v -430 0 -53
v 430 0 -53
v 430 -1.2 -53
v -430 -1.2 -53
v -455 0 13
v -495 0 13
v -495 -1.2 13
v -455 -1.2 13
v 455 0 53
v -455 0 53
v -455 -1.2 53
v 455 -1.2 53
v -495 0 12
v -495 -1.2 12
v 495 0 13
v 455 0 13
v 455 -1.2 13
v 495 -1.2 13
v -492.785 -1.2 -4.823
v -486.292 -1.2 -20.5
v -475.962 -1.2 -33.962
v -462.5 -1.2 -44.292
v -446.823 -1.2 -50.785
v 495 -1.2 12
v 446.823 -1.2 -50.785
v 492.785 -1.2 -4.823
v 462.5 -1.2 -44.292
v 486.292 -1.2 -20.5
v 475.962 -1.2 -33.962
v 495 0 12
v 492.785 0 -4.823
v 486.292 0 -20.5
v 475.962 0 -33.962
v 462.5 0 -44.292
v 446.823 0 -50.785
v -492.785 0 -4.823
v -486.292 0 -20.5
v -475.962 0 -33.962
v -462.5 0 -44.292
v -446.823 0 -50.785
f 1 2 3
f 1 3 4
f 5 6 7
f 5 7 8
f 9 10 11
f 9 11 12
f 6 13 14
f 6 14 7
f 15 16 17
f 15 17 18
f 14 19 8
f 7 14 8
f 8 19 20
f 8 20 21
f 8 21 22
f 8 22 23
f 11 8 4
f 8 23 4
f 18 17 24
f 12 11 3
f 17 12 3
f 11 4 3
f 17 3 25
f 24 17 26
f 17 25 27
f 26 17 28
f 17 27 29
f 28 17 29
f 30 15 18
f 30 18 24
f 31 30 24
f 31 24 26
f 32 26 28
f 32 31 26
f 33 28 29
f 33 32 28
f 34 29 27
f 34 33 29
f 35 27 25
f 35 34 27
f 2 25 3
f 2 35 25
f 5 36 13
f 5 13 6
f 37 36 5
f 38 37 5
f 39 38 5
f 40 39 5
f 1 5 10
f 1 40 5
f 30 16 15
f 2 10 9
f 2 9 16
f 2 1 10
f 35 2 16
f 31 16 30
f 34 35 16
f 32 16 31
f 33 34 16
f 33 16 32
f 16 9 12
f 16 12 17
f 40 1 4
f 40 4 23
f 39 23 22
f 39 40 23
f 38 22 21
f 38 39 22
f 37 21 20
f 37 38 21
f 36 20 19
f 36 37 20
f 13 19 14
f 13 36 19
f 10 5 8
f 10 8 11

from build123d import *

# Parameters (mm, degrees)
BASE_FLANGE1_DEPTH = 1.2


# Sheet-metal steps are written as plain solids
with BuildPart() as part:
    # Sketch1 → Base-Flange1 (new body)
    with BuildSketch(Plane(origin=(0, 0, 0), x_dir=(1, 0, 0), z_dir=(0, 1, 0))):
        with BuildLine():
            Line((-455, -53), (455, -53))
            Line((455, -53), (455, -13))
            Line((455, -13), (495, -13))
            Line((495, -13), (495, -12))
            ThreePointArc((495, -12), (475.961940777, 33.961940777), (430, 53))
            Line((430, 53), (-430, 53))
            ThreePointArc((-430, 53), (-475.961940777, 33.961940777), (-495, -12))
            Line((-495, -12), (-495, -13))
            Line((-495, -13), (-455, -13))
            Line((-455, -13), (-455, -53))
        make_face()
    extrude(amount=-BASE_FLANGE1_DEPTH)


solid = part.part
